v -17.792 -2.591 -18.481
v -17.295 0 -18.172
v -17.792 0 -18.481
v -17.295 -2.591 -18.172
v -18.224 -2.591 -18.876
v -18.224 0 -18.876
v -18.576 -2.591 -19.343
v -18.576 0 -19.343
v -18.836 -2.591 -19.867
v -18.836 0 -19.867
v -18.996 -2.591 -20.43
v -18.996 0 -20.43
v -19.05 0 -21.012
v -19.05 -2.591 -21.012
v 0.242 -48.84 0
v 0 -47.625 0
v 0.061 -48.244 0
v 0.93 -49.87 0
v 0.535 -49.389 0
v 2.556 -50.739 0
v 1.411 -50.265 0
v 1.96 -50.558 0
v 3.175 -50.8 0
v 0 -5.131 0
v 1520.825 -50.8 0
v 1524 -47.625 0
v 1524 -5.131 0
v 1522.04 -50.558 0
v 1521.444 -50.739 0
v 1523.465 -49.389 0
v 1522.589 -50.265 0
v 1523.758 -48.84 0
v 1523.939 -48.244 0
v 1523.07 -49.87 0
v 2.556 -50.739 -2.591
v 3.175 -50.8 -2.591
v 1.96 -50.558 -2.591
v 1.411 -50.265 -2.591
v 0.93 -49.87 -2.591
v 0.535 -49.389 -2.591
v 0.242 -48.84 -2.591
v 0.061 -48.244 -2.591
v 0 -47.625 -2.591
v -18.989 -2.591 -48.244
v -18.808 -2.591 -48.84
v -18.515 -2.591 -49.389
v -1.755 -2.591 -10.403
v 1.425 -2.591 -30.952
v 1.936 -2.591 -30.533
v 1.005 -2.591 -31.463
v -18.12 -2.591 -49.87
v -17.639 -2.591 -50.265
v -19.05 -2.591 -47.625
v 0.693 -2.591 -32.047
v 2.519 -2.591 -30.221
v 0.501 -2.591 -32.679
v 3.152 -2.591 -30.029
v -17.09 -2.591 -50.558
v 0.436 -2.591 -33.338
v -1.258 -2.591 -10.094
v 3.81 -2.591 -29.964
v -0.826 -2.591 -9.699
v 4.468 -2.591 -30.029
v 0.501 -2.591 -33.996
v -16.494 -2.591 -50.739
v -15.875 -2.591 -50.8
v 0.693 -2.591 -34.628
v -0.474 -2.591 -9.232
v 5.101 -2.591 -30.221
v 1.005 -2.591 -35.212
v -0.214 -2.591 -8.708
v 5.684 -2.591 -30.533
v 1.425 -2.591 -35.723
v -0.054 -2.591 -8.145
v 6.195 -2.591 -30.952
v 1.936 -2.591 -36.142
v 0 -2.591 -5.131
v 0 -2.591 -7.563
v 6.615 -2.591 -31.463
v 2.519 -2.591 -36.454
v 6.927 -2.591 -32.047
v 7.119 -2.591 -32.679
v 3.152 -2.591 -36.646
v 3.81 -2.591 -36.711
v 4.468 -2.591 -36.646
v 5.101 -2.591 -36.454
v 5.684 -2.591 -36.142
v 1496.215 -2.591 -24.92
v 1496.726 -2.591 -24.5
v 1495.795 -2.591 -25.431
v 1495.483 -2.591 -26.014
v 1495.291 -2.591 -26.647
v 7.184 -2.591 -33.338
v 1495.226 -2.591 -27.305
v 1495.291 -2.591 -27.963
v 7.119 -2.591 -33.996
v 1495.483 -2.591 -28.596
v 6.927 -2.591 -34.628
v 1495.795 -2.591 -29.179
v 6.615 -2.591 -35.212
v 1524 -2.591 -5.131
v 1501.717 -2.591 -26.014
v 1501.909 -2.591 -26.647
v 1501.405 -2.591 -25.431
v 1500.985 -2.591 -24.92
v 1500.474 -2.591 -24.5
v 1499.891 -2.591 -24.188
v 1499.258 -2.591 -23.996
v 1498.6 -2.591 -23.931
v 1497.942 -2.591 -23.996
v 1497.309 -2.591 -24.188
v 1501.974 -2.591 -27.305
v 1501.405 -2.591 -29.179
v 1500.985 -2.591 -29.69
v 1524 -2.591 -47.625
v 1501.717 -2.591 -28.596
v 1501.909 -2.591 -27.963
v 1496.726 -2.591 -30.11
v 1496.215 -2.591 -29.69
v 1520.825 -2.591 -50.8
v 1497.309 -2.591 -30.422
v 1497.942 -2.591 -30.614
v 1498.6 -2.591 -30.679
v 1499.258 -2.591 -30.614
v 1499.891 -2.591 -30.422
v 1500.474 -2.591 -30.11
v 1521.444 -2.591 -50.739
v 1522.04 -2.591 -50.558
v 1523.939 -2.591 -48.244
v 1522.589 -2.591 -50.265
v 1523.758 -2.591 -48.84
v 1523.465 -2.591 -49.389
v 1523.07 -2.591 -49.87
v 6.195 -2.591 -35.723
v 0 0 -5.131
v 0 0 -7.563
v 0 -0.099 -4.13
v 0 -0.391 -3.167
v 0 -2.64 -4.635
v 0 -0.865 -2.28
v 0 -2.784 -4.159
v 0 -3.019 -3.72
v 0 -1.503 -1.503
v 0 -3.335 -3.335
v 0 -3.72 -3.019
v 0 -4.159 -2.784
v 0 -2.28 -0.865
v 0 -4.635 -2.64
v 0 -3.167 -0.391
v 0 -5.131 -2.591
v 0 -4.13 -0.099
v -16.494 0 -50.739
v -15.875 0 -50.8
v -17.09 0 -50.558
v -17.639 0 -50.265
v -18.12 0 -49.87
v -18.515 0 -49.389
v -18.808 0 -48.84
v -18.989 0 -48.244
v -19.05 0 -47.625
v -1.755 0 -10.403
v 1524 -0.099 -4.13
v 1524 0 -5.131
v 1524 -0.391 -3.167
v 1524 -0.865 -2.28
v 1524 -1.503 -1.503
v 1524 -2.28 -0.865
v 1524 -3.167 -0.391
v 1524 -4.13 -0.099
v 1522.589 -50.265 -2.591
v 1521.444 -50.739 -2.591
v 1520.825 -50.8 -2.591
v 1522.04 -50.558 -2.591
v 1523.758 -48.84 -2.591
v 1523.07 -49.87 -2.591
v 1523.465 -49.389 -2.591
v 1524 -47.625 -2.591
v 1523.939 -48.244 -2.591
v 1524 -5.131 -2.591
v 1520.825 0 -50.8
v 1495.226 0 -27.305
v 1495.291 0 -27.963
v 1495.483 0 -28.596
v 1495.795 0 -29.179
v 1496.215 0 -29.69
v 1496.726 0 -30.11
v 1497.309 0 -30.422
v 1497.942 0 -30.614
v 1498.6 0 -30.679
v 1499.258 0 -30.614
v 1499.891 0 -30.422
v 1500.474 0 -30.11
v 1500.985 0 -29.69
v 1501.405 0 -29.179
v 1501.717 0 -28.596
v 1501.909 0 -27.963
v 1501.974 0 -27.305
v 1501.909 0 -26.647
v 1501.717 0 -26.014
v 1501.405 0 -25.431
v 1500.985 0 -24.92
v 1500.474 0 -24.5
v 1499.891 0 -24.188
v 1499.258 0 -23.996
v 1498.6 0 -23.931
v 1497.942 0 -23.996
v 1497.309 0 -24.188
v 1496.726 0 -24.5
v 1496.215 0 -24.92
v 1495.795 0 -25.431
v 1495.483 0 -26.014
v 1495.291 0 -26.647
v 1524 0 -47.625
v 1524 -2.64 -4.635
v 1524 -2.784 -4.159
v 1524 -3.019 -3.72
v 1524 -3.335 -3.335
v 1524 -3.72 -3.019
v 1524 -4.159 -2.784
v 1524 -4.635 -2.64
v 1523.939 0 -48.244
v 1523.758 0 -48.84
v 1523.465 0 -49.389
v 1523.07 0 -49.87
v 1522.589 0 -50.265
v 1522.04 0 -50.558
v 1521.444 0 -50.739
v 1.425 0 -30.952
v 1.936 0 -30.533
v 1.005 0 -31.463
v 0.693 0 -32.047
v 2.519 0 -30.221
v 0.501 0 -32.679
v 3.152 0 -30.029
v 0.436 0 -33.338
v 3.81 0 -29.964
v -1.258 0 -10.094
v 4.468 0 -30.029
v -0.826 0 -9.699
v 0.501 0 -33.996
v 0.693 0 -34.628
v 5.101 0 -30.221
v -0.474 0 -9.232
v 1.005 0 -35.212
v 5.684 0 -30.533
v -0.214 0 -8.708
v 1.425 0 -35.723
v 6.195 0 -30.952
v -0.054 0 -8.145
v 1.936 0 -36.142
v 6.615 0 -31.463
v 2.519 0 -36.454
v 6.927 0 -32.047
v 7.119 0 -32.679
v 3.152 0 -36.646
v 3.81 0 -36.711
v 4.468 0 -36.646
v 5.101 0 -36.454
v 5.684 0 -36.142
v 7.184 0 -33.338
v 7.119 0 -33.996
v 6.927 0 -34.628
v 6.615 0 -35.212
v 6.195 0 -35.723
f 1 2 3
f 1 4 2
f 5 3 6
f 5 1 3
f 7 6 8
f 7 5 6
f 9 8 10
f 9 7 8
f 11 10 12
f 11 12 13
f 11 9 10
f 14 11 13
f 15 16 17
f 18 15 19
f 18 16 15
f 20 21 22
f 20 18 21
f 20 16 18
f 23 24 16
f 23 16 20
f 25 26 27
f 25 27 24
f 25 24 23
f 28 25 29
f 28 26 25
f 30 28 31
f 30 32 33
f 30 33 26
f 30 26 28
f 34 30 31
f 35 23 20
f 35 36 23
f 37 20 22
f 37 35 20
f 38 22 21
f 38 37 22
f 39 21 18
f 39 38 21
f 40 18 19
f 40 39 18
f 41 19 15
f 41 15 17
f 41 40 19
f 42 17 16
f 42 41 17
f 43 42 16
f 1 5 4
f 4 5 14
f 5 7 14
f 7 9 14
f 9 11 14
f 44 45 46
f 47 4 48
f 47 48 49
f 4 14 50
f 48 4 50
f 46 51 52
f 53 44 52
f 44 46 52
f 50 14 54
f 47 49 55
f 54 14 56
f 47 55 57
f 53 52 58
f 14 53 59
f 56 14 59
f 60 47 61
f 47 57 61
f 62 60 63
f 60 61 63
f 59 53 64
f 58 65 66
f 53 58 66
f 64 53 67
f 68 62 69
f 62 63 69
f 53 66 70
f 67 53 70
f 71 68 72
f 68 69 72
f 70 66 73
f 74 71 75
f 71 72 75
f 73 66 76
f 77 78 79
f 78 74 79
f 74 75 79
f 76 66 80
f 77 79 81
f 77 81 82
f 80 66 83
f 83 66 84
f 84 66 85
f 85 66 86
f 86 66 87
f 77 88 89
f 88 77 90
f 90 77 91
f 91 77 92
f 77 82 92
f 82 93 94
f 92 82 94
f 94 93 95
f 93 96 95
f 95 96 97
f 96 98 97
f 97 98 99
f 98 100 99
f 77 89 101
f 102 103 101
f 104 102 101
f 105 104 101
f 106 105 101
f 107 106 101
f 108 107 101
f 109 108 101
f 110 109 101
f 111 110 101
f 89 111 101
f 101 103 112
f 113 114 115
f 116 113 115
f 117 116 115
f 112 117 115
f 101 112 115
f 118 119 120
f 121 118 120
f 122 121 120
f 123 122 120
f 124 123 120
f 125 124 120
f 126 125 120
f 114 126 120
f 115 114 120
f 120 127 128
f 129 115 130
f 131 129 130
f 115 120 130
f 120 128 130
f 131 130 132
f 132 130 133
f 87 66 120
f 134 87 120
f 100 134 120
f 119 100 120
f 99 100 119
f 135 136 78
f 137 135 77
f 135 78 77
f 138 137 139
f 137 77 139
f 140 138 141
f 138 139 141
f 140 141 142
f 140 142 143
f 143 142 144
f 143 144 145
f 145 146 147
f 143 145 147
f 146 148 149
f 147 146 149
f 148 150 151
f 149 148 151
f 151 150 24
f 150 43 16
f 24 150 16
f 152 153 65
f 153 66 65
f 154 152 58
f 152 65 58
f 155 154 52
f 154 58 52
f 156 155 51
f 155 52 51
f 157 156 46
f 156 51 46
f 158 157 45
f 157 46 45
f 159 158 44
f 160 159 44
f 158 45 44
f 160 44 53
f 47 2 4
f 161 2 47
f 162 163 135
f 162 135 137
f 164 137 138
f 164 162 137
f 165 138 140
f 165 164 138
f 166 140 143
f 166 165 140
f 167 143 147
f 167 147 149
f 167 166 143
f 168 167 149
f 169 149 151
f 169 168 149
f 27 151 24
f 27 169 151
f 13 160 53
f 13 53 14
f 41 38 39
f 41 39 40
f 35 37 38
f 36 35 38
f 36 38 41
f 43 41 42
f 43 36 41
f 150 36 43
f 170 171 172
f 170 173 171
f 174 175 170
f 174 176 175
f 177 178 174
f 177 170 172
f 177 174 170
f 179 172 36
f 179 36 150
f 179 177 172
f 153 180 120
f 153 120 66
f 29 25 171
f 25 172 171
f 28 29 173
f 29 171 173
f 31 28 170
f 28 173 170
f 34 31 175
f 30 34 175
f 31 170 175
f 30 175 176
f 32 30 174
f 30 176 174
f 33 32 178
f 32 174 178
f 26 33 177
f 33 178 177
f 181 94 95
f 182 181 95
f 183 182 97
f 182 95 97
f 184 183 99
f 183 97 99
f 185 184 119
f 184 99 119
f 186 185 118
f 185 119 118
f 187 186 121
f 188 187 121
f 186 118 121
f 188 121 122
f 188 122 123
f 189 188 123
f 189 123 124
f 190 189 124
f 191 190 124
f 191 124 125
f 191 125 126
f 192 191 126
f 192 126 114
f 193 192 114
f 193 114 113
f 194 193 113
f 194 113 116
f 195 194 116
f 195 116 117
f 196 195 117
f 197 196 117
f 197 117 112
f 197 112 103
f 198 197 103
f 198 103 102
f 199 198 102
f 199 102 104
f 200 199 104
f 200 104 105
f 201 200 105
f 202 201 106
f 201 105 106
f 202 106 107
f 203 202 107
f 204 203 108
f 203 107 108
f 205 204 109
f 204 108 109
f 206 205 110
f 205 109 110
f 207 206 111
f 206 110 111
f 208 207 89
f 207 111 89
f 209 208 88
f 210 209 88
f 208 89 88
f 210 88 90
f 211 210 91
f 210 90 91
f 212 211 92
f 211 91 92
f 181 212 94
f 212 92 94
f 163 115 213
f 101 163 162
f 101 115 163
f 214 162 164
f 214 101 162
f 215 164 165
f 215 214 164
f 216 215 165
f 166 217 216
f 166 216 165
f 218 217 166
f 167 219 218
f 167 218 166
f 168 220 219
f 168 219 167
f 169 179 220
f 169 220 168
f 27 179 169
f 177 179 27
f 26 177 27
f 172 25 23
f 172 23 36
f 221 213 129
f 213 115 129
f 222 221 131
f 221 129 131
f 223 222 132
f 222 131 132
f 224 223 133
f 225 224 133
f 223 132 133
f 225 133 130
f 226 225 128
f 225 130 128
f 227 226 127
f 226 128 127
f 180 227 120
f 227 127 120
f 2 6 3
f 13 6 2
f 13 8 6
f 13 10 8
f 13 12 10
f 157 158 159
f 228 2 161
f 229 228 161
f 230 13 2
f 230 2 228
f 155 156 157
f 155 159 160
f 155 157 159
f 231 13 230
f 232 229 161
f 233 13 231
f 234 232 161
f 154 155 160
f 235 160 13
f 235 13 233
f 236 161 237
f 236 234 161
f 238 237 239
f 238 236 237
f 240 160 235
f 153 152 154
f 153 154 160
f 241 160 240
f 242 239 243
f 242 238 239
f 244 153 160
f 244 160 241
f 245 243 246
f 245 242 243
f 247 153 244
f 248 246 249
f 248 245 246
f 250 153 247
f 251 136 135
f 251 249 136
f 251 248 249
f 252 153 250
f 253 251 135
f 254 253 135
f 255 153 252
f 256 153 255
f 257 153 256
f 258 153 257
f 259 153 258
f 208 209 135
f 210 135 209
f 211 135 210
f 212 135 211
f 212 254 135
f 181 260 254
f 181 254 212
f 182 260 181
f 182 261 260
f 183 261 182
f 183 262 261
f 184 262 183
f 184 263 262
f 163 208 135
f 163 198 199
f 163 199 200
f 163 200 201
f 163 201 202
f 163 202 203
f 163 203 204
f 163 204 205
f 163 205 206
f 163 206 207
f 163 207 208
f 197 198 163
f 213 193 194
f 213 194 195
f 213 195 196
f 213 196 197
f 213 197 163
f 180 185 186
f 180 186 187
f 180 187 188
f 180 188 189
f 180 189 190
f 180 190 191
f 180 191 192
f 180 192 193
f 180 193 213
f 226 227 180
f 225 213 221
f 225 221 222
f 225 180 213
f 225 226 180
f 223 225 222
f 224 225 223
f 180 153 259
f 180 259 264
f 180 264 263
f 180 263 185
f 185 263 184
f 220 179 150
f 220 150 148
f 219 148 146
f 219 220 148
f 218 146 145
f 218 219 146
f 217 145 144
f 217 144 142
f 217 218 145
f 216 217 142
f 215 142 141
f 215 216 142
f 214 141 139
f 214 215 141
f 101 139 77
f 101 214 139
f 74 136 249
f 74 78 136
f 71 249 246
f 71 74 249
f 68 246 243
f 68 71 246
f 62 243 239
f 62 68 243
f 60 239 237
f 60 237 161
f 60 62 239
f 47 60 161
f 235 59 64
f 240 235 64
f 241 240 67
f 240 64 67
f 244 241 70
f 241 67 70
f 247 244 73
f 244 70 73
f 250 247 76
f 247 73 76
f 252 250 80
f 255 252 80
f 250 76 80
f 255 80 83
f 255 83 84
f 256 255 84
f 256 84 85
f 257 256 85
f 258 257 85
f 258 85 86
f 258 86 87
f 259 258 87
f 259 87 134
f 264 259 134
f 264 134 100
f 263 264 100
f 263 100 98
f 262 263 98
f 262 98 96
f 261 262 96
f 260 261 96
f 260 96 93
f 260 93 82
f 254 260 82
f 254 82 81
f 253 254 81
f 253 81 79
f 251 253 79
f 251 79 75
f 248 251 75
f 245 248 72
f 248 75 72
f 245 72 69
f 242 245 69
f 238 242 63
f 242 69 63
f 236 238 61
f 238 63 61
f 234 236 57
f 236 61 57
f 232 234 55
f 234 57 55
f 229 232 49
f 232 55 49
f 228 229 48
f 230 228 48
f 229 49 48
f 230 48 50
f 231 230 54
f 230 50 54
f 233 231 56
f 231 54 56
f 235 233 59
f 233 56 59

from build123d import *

# Parameters (mm, degrees)
BASE_FLANGE1_DEPTH               = 2.5908
EDGE_FLANGE1_STRIP_W             = 15.4432
EDGE_FLANGE1_STRIP_H             = 2.5908
EDGE_FLANGE1_STRIP_CUT_DEPTH     = 1524
EDGE_FLANGE1_DEPTH               = 1524
F_17_64_0_26563_DIAMETER_HOLE1_D = 6.747002
FILLET1_R                        = 3.175
F_17_64_0_26563_DIAMETER_HOLE2_D = 6.747002


# Sheet-metal steps are written as plain solids
with BuildPart() as part:
    # Sketch2 → Base-Flange1 (new body)
    with BuildSketch(Plane(origin=(0, 0, 0), x_dir=(1, 0, 0), z_dir=(0, 1, 0))):
        Polygon((0, 0), (1524, 0), (1524, 50.8), (-19.05, 50.8), (-19.05, 19.05), (0, 9.525), align=None)
    extrude(amount=-BASE_FLANGE1_DEPTH)

    # Edge-Flange1 strip (across the edge) → Edge-Flange1 strip cut (cut)
    with BuildSketch(Plane(origin=(1524, -2.5908, 0), x_dir=(0, 0, -1), z_dir=(-1, 0, 0))):
        with Locations((-2.5908, -1.2954)):
            Rectangle(EDGE_FLANGE1_STRIP_W, EDGE_FLANGE1_STRIP_H)
    extrude(amount=EDGE_FLANGE1_STRIP_CUT_DEPTH, mode=Mode.SUBTRACT)

    # Edge-Flange1 section (across the edge) → Edge-Flange1 (add)
    with BuildSketch(Plane(origin=(1524, -2.5908, 0), x_dir=(0, 0, -1), z_dir=(-1, 0, 0))):
        with BuildLine():
            Line((0, 2.54), (0, 48.2092))
            Line((0, 48.2092), (2.5908, 48.2092))
            Line((2.5908, 48.2092), (2.5908, 2.54))
            ThreePointArc((2.5908, 2.54), (3.334748776, 0.743948776), (5.1308, 0))
            Line((5.1308, 0), (5.1308, -2.5908))
            ThreePointArc((5.1308, -2.5908), (1.502776527, -1.088023473), (0, 2.54))
        make_face()
    extrude(amount=EDGE_FLANGE1_DEPTH)

    # 17/64 (0.26563) Diameter Hole1 (through all)
    with Locations(Plane(origin=(0, 0, 0), x_dir=(1, 0, 0), z_dir=(0, 1, 0))):
        with Locations((1498.6, 27.305)):
            Hole(F_17_64_0_26563_DIAMETER_HOLE1_D / 2)

    # Fillet1
    fillet1_edges = [part.edges().sort_by_distance(p)[0] for p in [
        (0, -1.2954, -9.525),
        (-19.05, -1.2954, -19.05),
        (-19.05, -1.2954, -50.8),
        (1524, -1.2954, -50.8),
        (1524, -50.8, -1.2954),
        (0, -50.8, -1.2954),
    ]]
    fillet(fillet1_edges, radius=FILLET1_R)

    # 17/64 (0.26563) Diameter Hole2 (through all)
    with Locations(Plane(origin=(0, 0, 0), x_dir=(1, 0, 0), z_dir=(0, 1, 0))):
        with Locations((3.81, 33.3375)):
            Hole(F_17_64_0_26563_DIAMETER_HOLE2_D / 2)


solid = part.part
